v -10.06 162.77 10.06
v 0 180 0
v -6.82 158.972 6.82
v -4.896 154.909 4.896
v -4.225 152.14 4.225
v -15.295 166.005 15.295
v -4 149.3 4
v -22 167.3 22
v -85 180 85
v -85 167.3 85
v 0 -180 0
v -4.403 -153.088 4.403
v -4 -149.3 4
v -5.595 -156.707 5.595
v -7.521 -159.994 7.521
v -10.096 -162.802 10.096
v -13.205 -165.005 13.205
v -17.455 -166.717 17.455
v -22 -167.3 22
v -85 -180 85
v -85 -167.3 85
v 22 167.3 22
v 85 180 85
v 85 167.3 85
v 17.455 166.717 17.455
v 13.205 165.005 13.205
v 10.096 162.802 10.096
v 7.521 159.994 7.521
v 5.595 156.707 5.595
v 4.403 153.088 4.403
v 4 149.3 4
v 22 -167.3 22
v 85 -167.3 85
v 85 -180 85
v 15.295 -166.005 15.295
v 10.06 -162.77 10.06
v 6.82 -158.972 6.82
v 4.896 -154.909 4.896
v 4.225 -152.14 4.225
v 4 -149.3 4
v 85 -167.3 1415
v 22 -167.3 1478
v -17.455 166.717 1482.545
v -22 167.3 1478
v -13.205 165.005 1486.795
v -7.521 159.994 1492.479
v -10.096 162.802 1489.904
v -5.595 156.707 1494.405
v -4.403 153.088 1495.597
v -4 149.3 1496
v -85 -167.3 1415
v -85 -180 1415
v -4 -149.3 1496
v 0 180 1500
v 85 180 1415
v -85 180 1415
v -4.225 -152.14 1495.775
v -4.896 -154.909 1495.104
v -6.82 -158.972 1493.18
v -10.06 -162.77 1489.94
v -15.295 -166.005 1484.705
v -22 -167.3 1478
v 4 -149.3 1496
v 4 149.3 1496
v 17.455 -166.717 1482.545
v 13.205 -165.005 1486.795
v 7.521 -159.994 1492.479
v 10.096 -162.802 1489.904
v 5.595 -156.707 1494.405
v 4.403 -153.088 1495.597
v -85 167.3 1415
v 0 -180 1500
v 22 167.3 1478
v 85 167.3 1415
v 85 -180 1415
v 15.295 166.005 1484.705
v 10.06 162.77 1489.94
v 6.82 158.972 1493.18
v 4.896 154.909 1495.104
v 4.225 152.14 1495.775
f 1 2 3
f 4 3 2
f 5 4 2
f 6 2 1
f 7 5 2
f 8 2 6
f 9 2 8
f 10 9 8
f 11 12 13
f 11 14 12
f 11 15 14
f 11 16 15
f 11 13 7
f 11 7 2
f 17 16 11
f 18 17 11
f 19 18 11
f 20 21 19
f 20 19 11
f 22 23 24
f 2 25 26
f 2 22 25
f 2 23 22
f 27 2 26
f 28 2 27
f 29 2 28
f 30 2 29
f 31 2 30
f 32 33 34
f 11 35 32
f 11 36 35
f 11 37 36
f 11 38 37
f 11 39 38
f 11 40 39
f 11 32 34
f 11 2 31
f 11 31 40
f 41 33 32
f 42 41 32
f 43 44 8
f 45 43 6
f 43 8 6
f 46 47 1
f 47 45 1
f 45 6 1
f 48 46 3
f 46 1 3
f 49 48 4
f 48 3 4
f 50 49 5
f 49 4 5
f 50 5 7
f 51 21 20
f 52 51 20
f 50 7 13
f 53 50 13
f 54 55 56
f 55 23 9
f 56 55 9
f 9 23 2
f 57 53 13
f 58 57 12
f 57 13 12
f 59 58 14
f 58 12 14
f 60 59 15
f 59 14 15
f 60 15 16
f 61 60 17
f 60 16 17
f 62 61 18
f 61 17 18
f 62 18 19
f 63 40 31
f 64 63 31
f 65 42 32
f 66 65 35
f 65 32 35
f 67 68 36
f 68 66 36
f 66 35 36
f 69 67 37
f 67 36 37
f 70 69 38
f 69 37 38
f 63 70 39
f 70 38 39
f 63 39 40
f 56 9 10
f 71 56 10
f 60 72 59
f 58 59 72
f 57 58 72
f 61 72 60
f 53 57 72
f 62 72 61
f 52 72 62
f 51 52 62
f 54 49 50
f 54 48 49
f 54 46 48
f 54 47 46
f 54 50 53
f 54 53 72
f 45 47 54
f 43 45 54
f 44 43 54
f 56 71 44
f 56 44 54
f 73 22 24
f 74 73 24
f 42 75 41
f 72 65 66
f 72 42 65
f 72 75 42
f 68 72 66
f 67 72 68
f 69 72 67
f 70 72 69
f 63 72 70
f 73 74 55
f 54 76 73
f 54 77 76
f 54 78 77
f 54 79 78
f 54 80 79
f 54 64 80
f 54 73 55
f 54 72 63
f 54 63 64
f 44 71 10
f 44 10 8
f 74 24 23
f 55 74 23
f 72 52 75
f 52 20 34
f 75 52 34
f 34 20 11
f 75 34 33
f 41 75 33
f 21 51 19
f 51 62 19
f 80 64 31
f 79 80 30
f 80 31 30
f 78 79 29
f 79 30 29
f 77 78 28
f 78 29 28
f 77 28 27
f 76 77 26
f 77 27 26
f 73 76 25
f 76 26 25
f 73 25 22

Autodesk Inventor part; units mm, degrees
ref_plane "Start Plane" through (0, 0, 0) normal (0, 0, 1) x (1, 0, 0)
ref_plane "End Plane" through (0, 0, 1500) normal (0, 0, 1) x (1, 0, 0)
sketch "Sketch" plane through (0, 0, 0) normal (0, 0, 1) x (1, 0, 0)
  line L0 (-85, 167.3) -> (-22, 167.3)
  line L1 (-85, 180) -> (-85, 167.3)
  line L2 (85, 180) -> (-85, 180)
  line L3 (85, 167.3) -> (85, 180)
  line L4 (22, 167.3) -> (85, 167.3)
  line L5 (4, -149.3) -> (4, 149.3)
  line L6 (85, -167.3) -> (22, -167.3)
  line L7 (85, -180) -> (85, -167.3)
  line L8 (-85, -167.3) -> (-85, -180)
  line L9 (-22, -167.3) -> (-85, -167.3)
  line L10 (-4, 149.3) -> (-4, -149.3)
  line L11 (0, -252) -> (0, 252) construction
  line L12 (-4, -167.3) -> (4, -167.3) construction
  arc A0 (-22, -167.3) -> (-4, -149.3) centre (-22, -149.3) ccw
  arc A1 (-4, 149.3) -> (-22, 167.3) centre (-22, 149.3) ccw
  arc A2 (22, 167.3) -> (4, 149.3) centre (22, 149.3) ccw
  arc A3 (4, -149.3) -> (22, -167.3) centre (22, -149.3) ccw
  line L13 (-119, 0) -> (119, 0) construction
  line L14 (-85, -180) -> (85, -180)
  point P0 (-4, 167.3)
  point P1 (4, 167.3)
  point P2 (0, 0)
  point P3 (0, -167.3)
  point P4 (0, 0)
  dimension "d1" = 360
  dimension "d3" = 12.7
  dimension "d5" = 8
  dimension "d7" = 170
  dimension "d13" = 18
  dimension "d14" = 180
  dimension "d15" = 85
extrude "Body" add sketch "Sketch" along normal up to surface (1500 mm away) from surface at 0
sketch "Sketch3" plane through (0, 0, 0) normal (0, 0, 1) x (1, 0, 0)
  line L0 (0, 0) -> (10, 0)
ref_plane "Work Plane3" through (0, 0, 0) normal (0, -1, 0) x (1, 0, 0)
ref_plane "Work Plane4" through (85, 0, -85) normal (-0.7071, 0, -0.7071) x (-0.7071, 0, 0.7071)
split "Split1" plane through (85, 0, -85) removes the side toward (-0.7071, 0, -0.7071)
ref_plane "Work Plane5" through (-85, 0, -85) normal (0.7071, 0, -0.7071) x (-0.7071, 0, -0.7071)
split "Split2" plane through (-85, 0, -85) removes the side toward (0.7071, 0, -0.7071)
ref_plane "Work Plane6" through (-85, 0, 1585) normal (0.7071, 0, 0.7071) x (0.7071, 0, -0.7071)
split "Split3" plane through (-85, 0, 1585) removes the side toward (0.7071, 0, 0.7071)
ref_plane "Work Plane7" through (85, 0, 1585) normal (-0.7071, 0, 0.7071) x (0.7071, 0, 0.7071)
split "Split4" plane through (85, 0, 1585) removes the side toward (-0.7071, 0, 0.7071)
sketch "Sketch4" plane through (0, 0, 0) normal (0, -1, 0) x (1, 0, 0)
  line L0 (-2, 0) -> (12, 0) projected
  line L1 (-2, 1500) -> (12, 1500) projected
  dimension "d19" = 1500
equation "\"d1\" = ParH"
equation "\"d3\" = t2"
equation "\"d5\" = t1"
equation "\"d7\" = b"
equation "\"d13\" = R1"
equation "\"d14\" = 0.5 * d1"
equation "\"d15\" = 0.5 * d7"
equation "\"d8\" = G_L"
equation "\"b\" = 170"
equation "\"ParH\" = 360"
equation "\"R1\" = 18"
equation "\"G_L\" = d19"
equation "\"t1\" = 8"
equation "\"t2\" = 12.7"
equation "\"G_OFFSET_START\" = 0"
equation "\"G_OFFSET_END\" = 0"
properties part number "DIN 1025 - IPE 360-1500" material "Steel, Mild"
